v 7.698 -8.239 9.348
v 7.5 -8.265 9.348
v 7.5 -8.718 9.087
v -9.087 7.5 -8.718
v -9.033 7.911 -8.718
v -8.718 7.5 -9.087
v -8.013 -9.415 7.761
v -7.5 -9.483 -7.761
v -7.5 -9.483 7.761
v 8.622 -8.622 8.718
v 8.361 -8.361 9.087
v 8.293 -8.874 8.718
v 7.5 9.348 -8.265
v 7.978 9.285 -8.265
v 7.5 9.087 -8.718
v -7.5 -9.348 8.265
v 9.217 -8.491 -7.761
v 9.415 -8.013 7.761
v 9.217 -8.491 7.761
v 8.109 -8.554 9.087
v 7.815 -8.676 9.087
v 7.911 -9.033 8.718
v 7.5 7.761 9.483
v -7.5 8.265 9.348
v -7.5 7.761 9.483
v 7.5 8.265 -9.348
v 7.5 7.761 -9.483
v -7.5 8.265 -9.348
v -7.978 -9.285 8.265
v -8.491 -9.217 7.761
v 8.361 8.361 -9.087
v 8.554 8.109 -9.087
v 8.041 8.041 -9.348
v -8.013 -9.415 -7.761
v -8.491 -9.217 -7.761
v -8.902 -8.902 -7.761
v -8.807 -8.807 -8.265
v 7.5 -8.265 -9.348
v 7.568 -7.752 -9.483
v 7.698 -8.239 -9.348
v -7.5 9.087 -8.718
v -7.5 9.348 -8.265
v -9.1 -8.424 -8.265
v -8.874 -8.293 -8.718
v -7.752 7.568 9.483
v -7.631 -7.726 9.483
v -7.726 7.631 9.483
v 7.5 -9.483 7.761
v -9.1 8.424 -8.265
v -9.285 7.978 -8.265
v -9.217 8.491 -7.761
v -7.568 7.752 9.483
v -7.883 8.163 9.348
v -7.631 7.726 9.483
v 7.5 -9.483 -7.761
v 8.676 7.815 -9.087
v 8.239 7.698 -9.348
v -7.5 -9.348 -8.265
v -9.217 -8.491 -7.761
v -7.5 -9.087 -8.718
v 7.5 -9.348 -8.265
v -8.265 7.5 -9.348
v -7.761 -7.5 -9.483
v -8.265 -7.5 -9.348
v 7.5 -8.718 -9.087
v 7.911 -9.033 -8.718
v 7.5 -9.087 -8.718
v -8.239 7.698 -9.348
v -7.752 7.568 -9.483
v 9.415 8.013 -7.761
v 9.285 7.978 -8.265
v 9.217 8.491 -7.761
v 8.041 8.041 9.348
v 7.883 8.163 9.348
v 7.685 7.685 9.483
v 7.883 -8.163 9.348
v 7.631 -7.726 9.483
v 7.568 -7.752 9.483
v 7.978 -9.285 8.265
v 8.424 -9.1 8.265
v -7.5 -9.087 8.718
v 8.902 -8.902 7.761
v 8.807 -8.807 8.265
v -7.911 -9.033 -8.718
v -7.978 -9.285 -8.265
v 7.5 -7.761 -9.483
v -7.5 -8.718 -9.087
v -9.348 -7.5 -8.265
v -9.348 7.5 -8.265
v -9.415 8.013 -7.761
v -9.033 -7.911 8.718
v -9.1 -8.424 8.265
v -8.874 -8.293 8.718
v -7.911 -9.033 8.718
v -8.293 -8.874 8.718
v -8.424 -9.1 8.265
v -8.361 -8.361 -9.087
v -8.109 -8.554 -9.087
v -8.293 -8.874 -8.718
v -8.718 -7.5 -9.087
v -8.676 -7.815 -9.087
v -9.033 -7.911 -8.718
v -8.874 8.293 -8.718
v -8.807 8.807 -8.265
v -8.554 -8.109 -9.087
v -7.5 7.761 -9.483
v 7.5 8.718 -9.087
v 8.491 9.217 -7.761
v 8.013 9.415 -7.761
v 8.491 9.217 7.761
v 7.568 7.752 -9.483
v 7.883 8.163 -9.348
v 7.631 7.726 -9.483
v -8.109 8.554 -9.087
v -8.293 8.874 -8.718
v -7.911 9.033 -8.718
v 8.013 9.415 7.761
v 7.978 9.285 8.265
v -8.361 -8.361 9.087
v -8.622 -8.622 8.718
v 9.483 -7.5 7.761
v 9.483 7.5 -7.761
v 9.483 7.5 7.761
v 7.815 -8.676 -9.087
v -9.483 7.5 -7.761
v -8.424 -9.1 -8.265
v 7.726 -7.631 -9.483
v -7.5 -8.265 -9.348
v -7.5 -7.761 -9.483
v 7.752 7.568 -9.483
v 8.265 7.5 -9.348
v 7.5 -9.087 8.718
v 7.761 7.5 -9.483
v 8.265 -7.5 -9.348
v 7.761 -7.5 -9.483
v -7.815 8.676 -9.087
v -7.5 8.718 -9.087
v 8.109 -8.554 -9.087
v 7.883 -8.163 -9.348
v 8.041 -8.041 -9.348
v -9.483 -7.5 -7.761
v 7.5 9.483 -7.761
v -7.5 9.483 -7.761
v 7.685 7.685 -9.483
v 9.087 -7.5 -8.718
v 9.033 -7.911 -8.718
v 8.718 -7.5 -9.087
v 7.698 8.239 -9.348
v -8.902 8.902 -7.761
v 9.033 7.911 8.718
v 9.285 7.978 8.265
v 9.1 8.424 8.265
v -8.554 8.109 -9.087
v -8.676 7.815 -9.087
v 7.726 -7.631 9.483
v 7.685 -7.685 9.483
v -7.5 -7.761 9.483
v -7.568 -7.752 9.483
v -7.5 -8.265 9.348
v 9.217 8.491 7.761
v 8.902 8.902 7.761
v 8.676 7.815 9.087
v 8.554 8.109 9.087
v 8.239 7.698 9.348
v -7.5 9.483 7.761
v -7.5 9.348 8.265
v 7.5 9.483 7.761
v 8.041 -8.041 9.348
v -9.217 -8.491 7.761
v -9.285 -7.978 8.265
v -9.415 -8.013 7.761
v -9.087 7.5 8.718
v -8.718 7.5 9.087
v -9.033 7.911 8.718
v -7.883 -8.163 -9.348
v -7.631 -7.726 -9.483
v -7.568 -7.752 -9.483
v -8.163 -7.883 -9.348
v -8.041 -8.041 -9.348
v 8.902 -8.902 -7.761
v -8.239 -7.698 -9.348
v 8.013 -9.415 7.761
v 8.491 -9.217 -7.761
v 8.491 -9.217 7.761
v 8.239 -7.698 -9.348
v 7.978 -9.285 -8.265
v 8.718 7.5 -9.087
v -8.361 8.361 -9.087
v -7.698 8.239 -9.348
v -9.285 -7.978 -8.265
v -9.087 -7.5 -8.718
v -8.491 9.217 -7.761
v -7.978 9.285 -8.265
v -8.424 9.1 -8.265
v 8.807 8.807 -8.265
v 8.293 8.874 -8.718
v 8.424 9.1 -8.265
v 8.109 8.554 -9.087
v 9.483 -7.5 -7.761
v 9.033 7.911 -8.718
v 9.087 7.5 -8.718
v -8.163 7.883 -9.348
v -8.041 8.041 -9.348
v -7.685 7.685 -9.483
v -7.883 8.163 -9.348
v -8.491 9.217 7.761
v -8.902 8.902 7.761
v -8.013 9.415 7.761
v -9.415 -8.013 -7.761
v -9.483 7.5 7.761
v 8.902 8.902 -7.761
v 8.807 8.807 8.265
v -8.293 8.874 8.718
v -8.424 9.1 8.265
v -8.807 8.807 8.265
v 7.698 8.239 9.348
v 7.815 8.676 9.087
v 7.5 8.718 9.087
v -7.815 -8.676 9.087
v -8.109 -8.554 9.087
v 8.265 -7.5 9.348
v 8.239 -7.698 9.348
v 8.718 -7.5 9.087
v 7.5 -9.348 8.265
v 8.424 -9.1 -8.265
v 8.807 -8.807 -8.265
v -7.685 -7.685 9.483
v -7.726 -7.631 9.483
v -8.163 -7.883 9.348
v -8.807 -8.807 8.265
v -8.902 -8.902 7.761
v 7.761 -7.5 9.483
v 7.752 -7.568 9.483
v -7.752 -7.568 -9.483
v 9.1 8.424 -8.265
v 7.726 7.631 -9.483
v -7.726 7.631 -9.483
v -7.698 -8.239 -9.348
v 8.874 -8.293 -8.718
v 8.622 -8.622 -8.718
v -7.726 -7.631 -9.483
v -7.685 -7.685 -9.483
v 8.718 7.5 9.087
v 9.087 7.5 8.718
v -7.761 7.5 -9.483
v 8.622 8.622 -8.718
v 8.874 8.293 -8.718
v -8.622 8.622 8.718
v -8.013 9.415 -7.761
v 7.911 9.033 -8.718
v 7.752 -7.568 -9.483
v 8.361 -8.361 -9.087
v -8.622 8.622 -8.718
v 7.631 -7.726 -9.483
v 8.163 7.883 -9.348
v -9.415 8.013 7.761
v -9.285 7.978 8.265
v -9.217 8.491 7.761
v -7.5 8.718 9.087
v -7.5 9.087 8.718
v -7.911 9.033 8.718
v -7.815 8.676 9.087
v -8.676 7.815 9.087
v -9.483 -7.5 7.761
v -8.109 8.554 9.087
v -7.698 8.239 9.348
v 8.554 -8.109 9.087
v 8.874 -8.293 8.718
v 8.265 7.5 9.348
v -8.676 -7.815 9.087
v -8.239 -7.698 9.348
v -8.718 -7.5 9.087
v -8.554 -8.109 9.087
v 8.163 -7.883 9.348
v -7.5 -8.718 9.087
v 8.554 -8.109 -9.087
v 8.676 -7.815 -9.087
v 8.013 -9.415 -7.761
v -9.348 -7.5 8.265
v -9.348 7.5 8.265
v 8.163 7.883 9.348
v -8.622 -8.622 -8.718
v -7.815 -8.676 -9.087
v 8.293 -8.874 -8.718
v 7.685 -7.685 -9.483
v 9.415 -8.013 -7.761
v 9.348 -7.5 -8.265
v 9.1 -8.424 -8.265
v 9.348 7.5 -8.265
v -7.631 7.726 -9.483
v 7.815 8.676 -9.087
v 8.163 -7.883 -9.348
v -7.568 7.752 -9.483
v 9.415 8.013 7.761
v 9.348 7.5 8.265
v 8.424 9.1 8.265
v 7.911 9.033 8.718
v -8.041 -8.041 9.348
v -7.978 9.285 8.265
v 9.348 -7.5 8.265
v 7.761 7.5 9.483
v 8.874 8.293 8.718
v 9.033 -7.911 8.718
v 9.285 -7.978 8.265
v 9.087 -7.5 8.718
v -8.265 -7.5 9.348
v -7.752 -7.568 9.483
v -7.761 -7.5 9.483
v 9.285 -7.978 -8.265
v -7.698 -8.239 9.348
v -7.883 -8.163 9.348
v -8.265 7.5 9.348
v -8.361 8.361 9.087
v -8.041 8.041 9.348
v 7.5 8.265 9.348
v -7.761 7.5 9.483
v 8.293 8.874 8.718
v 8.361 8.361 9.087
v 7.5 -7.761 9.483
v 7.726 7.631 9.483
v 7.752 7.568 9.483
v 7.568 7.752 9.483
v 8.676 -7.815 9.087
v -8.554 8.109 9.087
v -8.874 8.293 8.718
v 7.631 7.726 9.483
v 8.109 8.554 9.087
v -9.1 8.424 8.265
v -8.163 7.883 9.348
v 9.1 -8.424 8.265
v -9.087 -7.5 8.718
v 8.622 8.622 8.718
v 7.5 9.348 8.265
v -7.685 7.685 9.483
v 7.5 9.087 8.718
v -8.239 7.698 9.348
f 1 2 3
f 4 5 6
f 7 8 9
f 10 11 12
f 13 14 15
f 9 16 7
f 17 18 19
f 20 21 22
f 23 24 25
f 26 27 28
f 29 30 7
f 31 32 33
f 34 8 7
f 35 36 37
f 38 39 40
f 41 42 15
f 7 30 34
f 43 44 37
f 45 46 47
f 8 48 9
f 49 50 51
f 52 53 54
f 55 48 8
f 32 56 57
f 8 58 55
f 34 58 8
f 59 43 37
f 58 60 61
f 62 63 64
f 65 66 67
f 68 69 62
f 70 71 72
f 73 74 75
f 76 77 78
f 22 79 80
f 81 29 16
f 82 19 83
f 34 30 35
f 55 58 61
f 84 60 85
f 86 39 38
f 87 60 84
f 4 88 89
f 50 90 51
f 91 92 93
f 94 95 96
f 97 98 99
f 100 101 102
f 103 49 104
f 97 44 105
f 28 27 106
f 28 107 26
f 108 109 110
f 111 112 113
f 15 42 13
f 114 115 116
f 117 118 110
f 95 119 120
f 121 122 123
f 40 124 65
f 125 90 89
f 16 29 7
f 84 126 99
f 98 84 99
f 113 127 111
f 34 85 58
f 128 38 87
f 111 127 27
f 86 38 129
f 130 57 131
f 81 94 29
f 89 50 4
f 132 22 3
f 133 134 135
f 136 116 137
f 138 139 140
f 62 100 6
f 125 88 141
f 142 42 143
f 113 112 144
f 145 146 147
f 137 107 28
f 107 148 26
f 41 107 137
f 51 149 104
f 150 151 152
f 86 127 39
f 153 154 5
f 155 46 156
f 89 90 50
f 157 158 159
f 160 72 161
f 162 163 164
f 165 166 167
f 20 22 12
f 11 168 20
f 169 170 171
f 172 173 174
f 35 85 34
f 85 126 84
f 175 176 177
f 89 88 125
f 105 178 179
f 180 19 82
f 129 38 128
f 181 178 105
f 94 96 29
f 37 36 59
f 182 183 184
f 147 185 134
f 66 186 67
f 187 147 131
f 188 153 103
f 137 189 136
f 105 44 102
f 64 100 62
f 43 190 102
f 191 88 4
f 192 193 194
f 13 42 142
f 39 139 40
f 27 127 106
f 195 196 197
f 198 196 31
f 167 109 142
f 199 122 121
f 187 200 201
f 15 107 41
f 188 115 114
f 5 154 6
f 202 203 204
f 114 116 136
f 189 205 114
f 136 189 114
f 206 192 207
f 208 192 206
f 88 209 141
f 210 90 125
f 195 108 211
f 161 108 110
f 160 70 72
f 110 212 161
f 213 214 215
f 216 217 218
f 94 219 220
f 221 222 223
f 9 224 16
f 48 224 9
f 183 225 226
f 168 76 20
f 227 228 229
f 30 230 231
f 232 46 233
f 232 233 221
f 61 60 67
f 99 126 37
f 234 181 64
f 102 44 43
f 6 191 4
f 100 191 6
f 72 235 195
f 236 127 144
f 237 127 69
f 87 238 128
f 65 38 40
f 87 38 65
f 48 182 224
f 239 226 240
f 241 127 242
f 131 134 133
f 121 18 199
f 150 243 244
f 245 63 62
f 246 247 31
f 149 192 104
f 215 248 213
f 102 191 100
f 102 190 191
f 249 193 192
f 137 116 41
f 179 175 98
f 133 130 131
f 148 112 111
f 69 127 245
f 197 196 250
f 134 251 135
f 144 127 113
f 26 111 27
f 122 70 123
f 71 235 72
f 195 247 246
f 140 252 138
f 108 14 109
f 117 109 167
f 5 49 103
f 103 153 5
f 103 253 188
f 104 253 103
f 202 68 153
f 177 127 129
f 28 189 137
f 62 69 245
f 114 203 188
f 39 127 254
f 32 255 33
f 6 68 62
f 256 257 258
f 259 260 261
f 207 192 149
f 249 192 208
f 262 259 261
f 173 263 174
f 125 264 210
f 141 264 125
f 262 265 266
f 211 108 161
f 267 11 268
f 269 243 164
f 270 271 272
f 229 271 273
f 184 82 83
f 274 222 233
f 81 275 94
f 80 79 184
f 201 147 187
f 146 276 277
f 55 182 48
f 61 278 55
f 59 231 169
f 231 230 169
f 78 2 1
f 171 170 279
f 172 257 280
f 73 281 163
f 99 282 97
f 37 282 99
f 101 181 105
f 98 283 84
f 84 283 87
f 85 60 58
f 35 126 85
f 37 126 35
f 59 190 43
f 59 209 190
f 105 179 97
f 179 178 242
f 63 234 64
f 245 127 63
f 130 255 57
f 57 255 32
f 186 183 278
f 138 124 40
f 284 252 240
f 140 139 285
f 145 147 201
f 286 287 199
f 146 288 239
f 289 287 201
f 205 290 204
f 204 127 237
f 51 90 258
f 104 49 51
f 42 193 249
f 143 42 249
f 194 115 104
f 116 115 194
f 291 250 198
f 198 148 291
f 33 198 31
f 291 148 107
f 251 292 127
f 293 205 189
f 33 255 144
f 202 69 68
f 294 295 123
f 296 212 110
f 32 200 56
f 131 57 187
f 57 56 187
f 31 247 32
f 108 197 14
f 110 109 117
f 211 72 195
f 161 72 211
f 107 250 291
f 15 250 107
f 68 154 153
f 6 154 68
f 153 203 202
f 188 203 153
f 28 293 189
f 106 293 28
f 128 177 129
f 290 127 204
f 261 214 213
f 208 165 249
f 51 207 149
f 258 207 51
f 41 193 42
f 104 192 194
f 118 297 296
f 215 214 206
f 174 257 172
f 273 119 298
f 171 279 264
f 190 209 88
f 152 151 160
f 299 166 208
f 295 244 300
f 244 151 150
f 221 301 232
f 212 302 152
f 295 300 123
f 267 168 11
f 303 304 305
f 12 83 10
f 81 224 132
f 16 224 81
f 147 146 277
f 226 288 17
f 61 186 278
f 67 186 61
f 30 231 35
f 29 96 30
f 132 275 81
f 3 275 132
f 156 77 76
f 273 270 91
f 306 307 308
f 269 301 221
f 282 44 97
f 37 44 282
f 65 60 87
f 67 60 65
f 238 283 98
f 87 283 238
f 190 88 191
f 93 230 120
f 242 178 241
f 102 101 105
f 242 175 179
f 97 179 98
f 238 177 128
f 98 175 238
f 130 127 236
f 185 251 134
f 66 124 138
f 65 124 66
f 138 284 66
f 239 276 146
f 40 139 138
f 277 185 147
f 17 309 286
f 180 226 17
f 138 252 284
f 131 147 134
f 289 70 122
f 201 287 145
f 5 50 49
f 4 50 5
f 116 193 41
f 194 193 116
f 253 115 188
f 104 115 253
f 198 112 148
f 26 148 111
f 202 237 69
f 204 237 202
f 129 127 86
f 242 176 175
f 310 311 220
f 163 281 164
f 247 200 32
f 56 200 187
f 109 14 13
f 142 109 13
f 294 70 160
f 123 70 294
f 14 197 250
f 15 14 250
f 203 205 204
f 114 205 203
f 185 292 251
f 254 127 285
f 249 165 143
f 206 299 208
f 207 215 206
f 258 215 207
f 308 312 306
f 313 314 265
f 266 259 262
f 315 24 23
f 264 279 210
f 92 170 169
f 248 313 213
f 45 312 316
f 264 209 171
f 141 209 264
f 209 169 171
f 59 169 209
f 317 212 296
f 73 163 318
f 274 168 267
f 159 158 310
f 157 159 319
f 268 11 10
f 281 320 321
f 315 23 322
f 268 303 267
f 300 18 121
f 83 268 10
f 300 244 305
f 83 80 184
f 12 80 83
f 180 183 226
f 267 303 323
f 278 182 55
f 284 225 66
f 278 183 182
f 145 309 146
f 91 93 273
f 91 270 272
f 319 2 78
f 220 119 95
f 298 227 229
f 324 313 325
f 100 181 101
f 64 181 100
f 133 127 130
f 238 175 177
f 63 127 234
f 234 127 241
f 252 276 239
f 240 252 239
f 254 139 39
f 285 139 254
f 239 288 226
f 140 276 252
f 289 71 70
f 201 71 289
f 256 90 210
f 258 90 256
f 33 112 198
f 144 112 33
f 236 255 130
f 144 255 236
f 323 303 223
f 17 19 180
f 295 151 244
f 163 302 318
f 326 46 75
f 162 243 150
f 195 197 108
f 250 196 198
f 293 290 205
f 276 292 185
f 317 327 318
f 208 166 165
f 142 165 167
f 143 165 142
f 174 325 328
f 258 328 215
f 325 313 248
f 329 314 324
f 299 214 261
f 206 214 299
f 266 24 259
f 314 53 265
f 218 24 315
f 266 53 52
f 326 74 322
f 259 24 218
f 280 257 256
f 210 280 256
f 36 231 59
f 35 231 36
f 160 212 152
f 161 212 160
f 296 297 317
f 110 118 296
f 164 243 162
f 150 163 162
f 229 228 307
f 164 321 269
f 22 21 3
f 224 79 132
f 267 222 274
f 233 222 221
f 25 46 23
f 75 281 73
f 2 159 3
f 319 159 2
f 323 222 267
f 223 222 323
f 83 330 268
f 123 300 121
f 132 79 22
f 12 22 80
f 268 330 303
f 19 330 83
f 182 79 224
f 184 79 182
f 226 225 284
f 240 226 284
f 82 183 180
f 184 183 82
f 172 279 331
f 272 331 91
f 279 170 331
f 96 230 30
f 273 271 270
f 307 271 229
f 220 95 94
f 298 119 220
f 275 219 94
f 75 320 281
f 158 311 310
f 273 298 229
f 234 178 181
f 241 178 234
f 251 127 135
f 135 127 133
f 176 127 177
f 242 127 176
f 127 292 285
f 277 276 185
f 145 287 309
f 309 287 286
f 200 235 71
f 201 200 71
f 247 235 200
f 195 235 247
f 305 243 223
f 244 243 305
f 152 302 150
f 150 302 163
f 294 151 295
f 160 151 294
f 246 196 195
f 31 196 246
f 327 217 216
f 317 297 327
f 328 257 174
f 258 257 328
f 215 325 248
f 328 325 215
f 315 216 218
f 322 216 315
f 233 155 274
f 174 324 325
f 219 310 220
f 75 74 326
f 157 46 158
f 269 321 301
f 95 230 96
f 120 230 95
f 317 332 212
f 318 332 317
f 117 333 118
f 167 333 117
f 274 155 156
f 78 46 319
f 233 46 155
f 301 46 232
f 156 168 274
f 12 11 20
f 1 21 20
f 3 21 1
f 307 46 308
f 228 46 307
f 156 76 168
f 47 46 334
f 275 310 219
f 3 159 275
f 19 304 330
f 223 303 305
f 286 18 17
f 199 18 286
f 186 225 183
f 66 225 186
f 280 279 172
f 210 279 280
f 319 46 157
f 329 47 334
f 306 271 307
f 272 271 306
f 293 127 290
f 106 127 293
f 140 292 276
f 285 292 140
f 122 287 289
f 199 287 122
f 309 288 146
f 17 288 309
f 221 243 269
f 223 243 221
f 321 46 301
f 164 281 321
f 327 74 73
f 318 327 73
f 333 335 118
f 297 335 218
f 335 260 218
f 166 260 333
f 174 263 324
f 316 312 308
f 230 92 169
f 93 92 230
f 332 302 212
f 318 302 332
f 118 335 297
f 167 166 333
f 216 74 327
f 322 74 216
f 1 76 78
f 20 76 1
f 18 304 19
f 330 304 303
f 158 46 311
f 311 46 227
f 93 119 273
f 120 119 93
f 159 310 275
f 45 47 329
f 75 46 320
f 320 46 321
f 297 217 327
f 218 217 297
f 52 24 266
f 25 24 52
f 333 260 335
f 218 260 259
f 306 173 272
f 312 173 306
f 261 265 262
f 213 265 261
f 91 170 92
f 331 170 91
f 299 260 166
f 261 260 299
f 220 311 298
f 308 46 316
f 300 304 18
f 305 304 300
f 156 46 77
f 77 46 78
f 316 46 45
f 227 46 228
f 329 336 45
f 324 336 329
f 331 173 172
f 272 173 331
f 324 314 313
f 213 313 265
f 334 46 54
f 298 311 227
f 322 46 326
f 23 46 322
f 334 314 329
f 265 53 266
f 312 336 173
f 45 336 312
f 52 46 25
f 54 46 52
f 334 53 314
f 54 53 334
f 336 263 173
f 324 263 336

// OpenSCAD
// Benchmark: Minkowski Operations
// Purpose: Tests expensive minkowski() operation
// Expected: Huge improvement with Manifold (parallelism)
// WARNING: This can be VERY slow without Manifold!

/* [Parameters] */
base_size = 15; // [10:30]
rounding = 2; // [1:5] Edge rounding amount
$fn = 24; // [12:48] Keep low for faster renders

/* [Hidden] */
// Rounded cube using minkowski
minkowski() {
    cube([base_size, base_size, base_size], center=true);
    sphere(r=rounding);
}
